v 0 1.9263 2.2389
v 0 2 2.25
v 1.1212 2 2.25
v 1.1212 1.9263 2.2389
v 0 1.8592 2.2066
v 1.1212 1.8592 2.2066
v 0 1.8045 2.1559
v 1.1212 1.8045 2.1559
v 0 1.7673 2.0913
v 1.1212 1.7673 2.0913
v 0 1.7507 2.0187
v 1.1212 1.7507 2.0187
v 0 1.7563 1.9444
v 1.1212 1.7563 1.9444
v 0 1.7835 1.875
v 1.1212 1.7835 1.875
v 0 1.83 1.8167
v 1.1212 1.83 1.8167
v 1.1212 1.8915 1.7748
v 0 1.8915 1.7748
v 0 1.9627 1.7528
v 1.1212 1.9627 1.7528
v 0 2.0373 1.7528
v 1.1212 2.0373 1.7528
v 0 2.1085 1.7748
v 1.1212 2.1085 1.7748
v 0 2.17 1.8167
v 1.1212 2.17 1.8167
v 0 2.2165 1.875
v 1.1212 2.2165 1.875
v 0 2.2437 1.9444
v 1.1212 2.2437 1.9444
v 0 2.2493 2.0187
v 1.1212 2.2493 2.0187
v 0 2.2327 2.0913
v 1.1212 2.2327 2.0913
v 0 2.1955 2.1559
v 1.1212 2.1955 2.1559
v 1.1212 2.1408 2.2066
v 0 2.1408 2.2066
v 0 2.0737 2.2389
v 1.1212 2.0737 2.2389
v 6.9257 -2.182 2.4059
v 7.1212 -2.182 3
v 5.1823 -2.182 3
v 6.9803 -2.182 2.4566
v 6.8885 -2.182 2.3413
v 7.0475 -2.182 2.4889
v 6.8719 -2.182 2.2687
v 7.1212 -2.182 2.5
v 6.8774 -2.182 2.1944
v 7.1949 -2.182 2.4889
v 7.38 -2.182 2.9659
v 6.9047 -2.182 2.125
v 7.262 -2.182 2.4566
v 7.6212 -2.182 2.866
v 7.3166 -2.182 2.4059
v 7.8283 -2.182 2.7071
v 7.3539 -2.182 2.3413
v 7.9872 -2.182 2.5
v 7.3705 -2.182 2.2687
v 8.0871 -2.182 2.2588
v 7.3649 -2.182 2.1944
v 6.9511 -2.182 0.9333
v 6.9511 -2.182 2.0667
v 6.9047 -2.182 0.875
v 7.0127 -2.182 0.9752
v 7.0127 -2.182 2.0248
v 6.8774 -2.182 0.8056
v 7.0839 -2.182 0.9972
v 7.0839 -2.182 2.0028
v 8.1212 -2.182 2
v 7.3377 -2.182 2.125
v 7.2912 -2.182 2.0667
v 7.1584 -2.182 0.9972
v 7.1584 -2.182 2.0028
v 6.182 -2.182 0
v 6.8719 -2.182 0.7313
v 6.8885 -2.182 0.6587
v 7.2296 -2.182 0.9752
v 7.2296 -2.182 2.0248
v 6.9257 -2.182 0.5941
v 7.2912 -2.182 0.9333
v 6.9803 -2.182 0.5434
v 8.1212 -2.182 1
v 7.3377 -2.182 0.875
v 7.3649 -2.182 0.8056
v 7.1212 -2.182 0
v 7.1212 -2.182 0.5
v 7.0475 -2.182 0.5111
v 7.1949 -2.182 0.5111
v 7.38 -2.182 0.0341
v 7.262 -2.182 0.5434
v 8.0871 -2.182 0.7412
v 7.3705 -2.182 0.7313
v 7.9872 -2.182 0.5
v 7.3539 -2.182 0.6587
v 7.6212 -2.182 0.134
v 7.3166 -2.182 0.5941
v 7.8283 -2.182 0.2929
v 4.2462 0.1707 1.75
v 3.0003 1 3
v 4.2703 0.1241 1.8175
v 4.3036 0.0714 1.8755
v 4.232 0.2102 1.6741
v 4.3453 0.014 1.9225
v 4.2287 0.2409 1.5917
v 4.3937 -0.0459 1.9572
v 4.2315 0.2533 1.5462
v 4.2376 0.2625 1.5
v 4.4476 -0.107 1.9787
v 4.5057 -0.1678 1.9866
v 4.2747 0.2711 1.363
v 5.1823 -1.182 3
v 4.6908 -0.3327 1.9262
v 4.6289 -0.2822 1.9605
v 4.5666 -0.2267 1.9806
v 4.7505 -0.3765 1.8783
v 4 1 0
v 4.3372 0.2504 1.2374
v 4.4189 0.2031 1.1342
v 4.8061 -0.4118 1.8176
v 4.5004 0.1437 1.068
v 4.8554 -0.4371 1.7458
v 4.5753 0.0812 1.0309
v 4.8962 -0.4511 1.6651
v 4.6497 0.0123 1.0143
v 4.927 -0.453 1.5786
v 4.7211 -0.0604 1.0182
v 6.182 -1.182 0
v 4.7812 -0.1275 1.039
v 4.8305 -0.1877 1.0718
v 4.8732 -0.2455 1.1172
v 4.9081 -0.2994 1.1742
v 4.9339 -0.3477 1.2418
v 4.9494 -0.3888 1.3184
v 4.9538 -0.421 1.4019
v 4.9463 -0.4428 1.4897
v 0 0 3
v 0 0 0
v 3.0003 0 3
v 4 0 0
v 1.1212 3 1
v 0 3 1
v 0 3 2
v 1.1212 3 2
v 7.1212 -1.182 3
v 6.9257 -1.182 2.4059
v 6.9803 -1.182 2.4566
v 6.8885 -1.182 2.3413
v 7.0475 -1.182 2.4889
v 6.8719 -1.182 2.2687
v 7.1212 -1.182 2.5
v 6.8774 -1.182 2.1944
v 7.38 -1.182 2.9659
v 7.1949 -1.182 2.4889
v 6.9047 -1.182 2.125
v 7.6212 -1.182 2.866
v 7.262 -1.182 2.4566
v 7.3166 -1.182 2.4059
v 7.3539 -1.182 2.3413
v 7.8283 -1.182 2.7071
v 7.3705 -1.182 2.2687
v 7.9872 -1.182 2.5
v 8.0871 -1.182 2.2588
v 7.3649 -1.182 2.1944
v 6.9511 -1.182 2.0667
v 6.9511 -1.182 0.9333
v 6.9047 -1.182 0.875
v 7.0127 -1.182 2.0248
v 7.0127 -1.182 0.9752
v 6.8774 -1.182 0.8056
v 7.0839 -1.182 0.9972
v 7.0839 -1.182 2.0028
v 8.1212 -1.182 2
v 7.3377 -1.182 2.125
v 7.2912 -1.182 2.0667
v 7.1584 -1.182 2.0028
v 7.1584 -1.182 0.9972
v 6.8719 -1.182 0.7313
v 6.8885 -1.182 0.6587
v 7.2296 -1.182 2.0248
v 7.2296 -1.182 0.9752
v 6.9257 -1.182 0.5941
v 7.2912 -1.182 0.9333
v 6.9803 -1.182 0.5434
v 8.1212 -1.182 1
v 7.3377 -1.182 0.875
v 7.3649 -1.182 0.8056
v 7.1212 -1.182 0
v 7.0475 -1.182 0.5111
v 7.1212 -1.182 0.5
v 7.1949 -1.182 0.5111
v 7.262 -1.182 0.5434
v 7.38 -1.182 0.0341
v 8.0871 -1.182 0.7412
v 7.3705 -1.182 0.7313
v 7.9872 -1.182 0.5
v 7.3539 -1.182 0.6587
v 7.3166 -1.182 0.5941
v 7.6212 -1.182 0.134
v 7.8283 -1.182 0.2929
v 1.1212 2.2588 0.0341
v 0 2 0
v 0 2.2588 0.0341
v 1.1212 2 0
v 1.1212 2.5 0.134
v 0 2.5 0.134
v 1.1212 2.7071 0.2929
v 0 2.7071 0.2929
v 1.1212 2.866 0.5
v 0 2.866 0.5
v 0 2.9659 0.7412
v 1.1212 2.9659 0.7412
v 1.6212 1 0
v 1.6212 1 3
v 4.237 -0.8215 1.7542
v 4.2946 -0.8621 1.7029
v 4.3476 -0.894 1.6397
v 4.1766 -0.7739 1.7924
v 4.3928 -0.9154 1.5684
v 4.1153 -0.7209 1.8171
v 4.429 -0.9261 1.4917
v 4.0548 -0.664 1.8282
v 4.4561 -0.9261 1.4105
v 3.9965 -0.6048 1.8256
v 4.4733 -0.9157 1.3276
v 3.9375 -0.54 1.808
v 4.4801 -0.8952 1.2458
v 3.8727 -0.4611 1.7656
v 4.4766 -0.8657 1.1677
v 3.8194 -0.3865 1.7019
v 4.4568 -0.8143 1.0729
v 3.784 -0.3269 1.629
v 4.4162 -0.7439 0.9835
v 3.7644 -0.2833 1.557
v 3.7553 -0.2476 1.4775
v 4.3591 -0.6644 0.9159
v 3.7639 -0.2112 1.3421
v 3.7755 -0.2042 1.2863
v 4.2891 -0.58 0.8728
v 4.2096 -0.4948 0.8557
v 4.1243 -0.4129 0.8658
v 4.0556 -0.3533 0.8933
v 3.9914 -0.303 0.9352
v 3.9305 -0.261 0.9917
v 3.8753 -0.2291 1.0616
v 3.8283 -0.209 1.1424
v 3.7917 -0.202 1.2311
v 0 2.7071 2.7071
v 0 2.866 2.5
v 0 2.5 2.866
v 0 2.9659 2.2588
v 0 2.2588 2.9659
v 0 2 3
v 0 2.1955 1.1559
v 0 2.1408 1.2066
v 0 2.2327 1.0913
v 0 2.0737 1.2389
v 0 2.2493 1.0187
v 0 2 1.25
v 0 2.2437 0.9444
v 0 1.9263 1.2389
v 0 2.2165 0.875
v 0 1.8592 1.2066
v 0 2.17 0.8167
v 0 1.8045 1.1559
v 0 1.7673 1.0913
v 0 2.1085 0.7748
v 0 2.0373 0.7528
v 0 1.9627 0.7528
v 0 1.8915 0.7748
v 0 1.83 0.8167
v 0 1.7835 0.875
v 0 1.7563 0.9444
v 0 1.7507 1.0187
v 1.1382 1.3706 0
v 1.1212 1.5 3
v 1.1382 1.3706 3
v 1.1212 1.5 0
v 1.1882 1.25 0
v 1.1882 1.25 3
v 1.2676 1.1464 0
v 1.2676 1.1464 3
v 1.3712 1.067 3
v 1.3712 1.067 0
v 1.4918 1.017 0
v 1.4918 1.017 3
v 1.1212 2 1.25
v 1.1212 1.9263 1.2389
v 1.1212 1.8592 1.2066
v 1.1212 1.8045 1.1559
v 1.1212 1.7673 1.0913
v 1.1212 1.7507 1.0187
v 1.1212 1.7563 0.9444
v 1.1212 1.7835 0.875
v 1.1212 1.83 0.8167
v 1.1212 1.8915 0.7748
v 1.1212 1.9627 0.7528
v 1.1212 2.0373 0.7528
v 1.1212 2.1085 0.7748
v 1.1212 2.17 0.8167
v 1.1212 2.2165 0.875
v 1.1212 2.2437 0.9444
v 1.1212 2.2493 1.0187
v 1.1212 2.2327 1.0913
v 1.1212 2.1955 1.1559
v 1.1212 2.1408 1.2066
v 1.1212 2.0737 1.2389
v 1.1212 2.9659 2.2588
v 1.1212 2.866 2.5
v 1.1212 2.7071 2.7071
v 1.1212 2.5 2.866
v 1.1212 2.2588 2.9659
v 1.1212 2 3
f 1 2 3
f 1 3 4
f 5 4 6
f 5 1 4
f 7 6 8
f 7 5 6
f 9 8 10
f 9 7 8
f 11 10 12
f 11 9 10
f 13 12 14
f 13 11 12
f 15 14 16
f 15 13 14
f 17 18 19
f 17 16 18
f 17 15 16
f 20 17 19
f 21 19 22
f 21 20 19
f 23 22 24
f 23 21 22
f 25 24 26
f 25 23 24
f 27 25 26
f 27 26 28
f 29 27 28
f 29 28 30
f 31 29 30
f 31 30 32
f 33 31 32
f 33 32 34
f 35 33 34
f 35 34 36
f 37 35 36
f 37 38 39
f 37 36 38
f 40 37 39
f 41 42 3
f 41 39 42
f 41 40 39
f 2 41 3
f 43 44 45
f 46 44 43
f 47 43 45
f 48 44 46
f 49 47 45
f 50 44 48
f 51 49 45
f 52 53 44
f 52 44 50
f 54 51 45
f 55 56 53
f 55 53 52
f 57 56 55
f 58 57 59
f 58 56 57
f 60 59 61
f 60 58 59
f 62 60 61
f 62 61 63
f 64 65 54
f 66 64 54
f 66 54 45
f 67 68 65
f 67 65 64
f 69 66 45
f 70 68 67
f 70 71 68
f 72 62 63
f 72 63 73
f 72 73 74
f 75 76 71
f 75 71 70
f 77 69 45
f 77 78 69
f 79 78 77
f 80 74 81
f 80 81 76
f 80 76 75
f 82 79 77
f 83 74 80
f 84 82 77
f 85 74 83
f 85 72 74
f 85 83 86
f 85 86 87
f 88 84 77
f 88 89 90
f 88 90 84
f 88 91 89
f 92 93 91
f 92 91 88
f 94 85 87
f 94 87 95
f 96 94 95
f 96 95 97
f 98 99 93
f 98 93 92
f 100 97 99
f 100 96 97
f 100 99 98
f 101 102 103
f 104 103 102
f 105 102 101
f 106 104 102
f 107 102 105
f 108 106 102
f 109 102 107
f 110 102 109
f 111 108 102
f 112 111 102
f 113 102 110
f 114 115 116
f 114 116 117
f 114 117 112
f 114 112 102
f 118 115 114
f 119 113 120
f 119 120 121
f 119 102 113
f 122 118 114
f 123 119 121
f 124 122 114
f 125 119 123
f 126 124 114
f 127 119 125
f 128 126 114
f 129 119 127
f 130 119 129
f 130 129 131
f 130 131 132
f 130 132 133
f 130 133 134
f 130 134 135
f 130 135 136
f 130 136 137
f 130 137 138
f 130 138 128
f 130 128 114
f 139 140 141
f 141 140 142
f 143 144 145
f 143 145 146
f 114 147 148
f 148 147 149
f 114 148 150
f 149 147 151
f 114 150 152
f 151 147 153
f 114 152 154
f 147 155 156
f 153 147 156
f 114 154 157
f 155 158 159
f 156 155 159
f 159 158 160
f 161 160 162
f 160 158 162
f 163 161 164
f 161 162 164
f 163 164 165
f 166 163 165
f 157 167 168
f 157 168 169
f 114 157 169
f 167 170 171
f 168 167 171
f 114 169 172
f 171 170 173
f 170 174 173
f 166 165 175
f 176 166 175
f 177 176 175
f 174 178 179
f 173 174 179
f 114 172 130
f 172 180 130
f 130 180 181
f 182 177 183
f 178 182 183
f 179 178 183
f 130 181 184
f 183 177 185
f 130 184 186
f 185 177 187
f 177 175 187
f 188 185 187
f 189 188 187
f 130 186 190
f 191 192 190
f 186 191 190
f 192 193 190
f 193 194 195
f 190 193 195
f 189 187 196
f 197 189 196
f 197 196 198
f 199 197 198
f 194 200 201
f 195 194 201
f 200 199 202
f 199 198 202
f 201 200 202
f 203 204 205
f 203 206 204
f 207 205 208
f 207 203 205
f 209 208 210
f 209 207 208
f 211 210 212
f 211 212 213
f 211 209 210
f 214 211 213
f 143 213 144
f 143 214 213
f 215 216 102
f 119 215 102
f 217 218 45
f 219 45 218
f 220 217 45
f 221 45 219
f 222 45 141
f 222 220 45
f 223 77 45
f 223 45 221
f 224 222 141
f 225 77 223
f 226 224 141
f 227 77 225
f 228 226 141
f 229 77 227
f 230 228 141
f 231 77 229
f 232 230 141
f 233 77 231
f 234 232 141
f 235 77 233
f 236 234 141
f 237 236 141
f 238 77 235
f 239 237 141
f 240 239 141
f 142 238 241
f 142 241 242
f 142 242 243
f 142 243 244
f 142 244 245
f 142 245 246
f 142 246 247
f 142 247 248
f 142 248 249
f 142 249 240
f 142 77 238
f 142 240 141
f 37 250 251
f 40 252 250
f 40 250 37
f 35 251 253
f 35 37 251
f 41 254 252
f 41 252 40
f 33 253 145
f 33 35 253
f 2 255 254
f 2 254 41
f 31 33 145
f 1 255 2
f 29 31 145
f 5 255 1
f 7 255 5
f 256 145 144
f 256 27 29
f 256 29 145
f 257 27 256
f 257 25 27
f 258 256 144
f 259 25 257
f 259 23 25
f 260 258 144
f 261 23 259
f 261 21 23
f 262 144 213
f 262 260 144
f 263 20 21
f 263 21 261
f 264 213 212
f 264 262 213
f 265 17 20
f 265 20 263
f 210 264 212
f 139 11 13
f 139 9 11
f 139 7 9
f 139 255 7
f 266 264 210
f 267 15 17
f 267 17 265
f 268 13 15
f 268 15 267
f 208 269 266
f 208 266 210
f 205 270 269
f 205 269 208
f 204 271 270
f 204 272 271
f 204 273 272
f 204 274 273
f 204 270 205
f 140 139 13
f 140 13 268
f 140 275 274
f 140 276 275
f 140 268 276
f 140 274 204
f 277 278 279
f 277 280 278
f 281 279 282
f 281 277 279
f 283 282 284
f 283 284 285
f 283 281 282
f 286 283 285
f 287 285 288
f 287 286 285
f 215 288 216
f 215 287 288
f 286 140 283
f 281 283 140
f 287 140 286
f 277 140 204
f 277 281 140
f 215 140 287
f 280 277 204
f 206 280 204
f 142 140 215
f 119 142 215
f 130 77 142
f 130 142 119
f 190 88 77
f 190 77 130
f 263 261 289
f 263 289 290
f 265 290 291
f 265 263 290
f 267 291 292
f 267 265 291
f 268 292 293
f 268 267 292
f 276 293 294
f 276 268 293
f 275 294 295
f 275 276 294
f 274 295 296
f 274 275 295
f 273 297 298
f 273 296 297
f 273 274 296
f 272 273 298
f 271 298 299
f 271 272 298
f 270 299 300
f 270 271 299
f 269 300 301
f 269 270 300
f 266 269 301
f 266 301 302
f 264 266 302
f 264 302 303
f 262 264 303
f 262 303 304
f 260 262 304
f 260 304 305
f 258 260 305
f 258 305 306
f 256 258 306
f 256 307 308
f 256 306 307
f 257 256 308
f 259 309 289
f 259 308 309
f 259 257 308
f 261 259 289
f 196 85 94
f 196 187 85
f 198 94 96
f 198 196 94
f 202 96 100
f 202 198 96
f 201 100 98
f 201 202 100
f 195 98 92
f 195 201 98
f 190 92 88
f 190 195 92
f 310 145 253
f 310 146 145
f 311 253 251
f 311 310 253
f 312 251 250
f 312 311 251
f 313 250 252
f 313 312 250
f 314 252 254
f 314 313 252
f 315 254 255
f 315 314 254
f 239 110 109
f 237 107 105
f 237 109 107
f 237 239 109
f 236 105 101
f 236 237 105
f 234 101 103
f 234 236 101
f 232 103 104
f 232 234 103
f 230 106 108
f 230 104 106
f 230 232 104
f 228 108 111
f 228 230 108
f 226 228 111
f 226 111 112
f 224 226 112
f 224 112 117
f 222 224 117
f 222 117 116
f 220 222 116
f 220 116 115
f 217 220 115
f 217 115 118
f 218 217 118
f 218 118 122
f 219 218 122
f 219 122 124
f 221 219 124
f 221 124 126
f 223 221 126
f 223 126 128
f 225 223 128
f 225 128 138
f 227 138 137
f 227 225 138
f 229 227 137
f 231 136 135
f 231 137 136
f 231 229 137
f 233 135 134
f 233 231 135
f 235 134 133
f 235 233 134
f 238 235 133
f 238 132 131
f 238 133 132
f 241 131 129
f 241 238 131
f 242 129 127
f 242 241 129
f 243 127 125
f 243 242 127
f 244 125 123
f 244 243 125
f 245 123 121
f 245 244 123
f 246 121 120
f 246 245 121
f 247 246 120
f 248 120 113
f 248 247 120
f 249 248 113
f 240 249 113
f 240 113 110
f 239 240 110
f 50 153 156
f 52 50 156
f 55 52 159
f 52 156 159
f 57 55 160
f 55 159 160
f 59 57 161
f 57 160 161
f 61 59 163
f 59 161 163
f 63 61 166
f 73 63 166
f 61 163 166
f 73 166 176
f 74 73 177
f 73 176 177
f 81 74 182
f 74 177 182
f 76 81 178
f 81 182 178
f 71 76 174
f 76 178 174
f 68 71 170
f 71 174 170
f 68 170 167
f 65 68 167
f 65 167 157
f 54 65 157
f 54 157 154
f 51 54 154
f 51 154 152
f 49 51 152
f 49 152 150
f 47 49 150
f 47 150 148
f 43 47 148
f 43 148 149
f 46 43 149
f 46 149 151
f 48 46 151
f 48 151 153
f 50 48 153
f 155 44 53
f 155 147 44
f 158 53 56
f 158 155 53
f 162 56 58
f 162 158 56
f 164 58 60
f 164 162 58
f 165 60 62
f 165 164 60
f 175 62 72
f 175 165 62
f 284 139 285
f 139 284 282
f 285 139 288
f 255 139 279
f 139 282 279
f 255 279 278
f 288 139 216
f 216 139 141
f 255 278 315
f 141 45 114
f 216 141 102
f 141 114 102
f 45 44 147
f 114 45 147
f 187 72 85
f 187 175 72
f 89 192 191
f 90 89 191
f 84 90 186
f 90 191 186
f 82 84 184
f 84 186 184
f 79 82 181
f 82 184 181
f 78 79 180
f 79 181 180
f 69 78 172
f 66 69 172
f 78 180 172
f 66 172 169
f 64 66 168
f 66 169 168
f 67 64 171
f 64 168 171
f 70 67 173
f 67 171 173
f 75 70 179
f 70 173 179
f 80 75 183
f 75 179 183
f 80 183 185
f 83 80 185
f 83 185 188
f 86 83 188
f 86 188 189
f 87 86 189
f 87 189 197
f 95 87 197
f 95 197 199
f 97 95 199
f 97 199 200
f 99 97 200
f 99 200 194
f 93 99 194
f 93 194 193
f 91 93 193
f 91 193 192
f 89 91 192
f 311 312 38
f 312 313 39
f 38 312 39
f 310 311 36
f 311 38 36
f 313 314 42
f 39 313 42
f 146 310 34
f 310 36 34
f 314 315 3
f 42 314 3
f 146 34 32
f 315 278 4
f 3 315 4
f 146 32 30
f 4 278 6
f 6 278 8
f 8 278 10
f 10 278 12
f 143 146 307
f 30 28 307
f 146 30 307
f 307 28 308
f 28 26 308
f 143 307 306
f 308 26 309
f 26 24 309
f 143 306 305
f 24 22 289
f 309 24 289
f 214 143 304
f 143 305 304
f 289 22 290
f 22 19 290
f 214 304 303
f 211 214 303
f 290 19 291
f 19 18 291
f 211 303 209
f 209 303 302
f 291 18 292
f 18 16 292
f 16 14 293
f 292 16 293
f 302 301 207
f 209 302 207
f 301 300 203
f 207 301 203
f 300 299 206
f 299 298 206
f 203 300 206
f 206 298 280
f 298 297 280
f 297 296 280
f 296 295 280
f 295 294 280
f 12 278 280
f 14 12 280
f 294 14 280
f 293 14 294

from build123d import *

# Parameters (mm, degrees)
SKETCH3_W               = 1.121172813
SKETCH3_H               = 3
BOSS_EXTRUDE1_DEPTH     = 3
SKETCH4_W               = 4
SKETCH4_H               = 1
BOSS_EXTRUDE2_DEPTH     = 3
FILLET3_R               = 1
CUT_EXTRUDE4_DEPTH      = 6.127147937
CUT_EXTRUDE4_DEPTH_BACK = 6.127147937
CUT_EXTRUDE5_DEPTH      = 6.830951895
BOSS_EXTRUDE4_REACH     = 11.163
SKETCH26_W              = 3
SKETCH26_H              = 1
FILLET6_R               = 1
SKETCH27_R              = 0.25
CUT_EXTRUDE6_DEPTH      = 10.614711327
CUT_EXTRUDE7_DEPTH      = 8.660792968
CUT_EXTRUDE7_DEPTH_BACK = 8.660792968
SKETCH28_R              = 0.5
FILLET7_R               = 0.5


with BuildPart() as part:
    # Sketch3 → Boss-Extrude1 (new body)
    with BuildSketch(Plane(origin=(0, 0, 0), x_dir=(1, 0, 0), z_dir=(0, 1, 0))):
        with Locations((0.560586407, -1.5)):
            Rectangle(SKETCH3_W, SKETCH3_H)
    extrude(amount=BOSS_EXTRUDE1_DEPTH)

    # Sketch4 → Boss-Extrude2 (add)
    with BuildSketch(Plane.XY):
        with Locations((2, 0.5)):
            Rectangle(SKETCH4_W, SKETCH4_H)
    extrude(amount=BOSS_EXTRUDE2_DEPTH)

    # Fillet3
    fillet3_edges = [part.edges().sort_by_distance(p)[0] for p in [
        (0.560586407, 3, 0),
        (0.560586407, 3, 3),
    ]]
    fillet(fillet3_edges, radius=FILLET3_R)

    # Sketch5 → Cut-Extrude4 (cut, two sides: drawn at the far end of the back side and taken through both)
    with BuildSketch(Plane(origin=(1.121172813, 0, 0), x_dir=(0, 0, -1), z_dir=(1, 0, 0)).offset(-CUT_EXTRUDE4_DEPTH_BACK)):
        with BuildLine():
            ThreePointArc((-1.75, 2), (-2, 2.25), (-2.25, 2))
            Line((-2.25, 2), (-1.75, 2))
        make_face()
        with BuildLine():
            Line((-1.75, 2), (-2.25, 2))
            ThreePointArc((-2.25, 2), (-2, 1.75), (-1.75, 2))
        make_face()
        with BuildLine():
            ThreePointArc((-0.75, 2), (-1, 2.25), (-1.25, 2))
            Line((-1.25, 2), (-0.75, 2))
        make_face()
        with BuildLine():
            Line((-0.75, 2), (-1.25, 2))
            ThreePointArc((-1.25, 2), (-1, 1.75), (-0.75, 2))
        make_face()
    extrude(amount=CUT_EXTRUDE4_DEPTH + CUT_EXTRUDE4_DEPTH_BACK, mode=Mode.SUBTRACT)

    # Sketch12 → Cut-Extrude5 (cut, through all)
    with BuildSketch(Plane.XZ):
        Polygon((4, 0), (3.000287903, 3), (4, 3), align=None)
    extrude(amount=-CUT_EXTRUDE5_DEPTH, mode=Mode.SUBTRACT)

    # Sweep1: read off the stored shape, not the designer's step
    # Sweep1: loft between two sections, ruled curve by curve
    sweep1_from = [
        Edge.make_line((5.182299836, -1.182011934, 3), (5.182299836, -2.182011934, 3)),
        Edge.make_line((3.000287903, 1, 3), (5.182299836, -1.182011934, 3)),
        Edge.make_line((5.182299836, -2.182011934, 3), (3.000287903, 0, 3)),
        Edge.make_line((3.000287903, 0, 3), (3.000287903, 1, 3)),
    ]
    sweep1_to = [
        Edge.make_line((6.182011934, -1.182011934, 0), (6.182011934, -2.182011934, 0)),
        Edge.make_line((4, 1, 0), (6.182011934, -1.182011934, 0)),
        Edge.make_line((6.182011934, -2.182011934, 0), (4, 0, 0)),
        Edge.make_line((4, 0, 0), (4, 1, 0)),
    ]
    sweep1 = Solid(Shell([*[Face.make_surface_from_curves(sweep1_from[k], sweep1_to[k]) for k in range(4)], Face(Wire(sweep1_from)), Face(Wire(sweep1_to))]))
    add(sweep1)

    # Sketch26 → Boss-Extrude4 (add, up to next)
    with BuildSketch(Plane(origin=(8.121172813, 0, 0), x_dir=(0, 0, -1), z_dir=(1, 0, 0)), mode=Mode.PRIVATE) as boss_extrude4_sk1:
        with Locations((-1.5, -1.682011934)):
            Rectangle(SKETCH26_W, SKETCH26_H)
    boss_extrude4_tool1 = extrude(boss_extrude4_sk1.sketch, amount=-BOSS_EXTRUDE4_REACH, mode=Mode.PRIVATE) - part.part
    add(boss_extrude4_tool1.solids().sort_by_distance((8.121173, -1.682012, 1.5))[0])

    # Fillet6
    fillet6_edges = [part.edges().sort_by_distance(p)[0] for p in [
        (8.121172813, -1.682011934, 0),
        (8.121172813, -1.682011934, 3),
    ]]
    fillet(fillet6_edges, radius=FILLET6_R)

    # Sketch27 → Cut-Extrude6 (cut, through all)
    with BuildSketch(Plane(origin=(0, -1.182011934, 0), x_dir=(1, 0, 0), z_dir=(0, 1, 0))):
        with Locations(Location((7.121172813, -2.25, 0), (0, 0, 270))):
            Circle(SKETCH27_R)
        with Locations(Location((7.121172813, -0.75, 0), (0, 0, 90))):
            Circle(SKETCH27_R)
    extrude(amount=-CUT_EXTRUDE6_DEPTH, mode=Mode.SUBTRACT)

    # Sketch28 → Cut-Extrude7 (cut, two sides: drawn at the far end of the back side and taken through both)
    with BuildSketch(Plane(origin=(2.368492821, 2.368492821, 0.789270309), x_dir=(0.16217717426622844, 0.16217717426622855, -0.973343273616273), z_dir=(0.6882576291963799, 0.6882576291963798, 0.2293531593546452)).offset(-CUT_EXTRUDE7_DEPTH_BACK)):
        with Locations(Location((-0.730194281, -3.310784177, 0), (0, 0, 90))):
            Circle(SKETCH28_R)
    extrude(amount=CUT_EXTRUDE7_DEPTH + CUT_EXTRUDE7_DEPTH_BACK, mode=Mode.SUBTRACT)

    # Fillet7
    fillet7_edges = [part.edges().sort_by_distance(p)[0] for p in [
        (1.121172813, 1, 1.5),
    ]]
    fillet(fillet7_edges, radius=FILLET7_R)


solid = part.part
